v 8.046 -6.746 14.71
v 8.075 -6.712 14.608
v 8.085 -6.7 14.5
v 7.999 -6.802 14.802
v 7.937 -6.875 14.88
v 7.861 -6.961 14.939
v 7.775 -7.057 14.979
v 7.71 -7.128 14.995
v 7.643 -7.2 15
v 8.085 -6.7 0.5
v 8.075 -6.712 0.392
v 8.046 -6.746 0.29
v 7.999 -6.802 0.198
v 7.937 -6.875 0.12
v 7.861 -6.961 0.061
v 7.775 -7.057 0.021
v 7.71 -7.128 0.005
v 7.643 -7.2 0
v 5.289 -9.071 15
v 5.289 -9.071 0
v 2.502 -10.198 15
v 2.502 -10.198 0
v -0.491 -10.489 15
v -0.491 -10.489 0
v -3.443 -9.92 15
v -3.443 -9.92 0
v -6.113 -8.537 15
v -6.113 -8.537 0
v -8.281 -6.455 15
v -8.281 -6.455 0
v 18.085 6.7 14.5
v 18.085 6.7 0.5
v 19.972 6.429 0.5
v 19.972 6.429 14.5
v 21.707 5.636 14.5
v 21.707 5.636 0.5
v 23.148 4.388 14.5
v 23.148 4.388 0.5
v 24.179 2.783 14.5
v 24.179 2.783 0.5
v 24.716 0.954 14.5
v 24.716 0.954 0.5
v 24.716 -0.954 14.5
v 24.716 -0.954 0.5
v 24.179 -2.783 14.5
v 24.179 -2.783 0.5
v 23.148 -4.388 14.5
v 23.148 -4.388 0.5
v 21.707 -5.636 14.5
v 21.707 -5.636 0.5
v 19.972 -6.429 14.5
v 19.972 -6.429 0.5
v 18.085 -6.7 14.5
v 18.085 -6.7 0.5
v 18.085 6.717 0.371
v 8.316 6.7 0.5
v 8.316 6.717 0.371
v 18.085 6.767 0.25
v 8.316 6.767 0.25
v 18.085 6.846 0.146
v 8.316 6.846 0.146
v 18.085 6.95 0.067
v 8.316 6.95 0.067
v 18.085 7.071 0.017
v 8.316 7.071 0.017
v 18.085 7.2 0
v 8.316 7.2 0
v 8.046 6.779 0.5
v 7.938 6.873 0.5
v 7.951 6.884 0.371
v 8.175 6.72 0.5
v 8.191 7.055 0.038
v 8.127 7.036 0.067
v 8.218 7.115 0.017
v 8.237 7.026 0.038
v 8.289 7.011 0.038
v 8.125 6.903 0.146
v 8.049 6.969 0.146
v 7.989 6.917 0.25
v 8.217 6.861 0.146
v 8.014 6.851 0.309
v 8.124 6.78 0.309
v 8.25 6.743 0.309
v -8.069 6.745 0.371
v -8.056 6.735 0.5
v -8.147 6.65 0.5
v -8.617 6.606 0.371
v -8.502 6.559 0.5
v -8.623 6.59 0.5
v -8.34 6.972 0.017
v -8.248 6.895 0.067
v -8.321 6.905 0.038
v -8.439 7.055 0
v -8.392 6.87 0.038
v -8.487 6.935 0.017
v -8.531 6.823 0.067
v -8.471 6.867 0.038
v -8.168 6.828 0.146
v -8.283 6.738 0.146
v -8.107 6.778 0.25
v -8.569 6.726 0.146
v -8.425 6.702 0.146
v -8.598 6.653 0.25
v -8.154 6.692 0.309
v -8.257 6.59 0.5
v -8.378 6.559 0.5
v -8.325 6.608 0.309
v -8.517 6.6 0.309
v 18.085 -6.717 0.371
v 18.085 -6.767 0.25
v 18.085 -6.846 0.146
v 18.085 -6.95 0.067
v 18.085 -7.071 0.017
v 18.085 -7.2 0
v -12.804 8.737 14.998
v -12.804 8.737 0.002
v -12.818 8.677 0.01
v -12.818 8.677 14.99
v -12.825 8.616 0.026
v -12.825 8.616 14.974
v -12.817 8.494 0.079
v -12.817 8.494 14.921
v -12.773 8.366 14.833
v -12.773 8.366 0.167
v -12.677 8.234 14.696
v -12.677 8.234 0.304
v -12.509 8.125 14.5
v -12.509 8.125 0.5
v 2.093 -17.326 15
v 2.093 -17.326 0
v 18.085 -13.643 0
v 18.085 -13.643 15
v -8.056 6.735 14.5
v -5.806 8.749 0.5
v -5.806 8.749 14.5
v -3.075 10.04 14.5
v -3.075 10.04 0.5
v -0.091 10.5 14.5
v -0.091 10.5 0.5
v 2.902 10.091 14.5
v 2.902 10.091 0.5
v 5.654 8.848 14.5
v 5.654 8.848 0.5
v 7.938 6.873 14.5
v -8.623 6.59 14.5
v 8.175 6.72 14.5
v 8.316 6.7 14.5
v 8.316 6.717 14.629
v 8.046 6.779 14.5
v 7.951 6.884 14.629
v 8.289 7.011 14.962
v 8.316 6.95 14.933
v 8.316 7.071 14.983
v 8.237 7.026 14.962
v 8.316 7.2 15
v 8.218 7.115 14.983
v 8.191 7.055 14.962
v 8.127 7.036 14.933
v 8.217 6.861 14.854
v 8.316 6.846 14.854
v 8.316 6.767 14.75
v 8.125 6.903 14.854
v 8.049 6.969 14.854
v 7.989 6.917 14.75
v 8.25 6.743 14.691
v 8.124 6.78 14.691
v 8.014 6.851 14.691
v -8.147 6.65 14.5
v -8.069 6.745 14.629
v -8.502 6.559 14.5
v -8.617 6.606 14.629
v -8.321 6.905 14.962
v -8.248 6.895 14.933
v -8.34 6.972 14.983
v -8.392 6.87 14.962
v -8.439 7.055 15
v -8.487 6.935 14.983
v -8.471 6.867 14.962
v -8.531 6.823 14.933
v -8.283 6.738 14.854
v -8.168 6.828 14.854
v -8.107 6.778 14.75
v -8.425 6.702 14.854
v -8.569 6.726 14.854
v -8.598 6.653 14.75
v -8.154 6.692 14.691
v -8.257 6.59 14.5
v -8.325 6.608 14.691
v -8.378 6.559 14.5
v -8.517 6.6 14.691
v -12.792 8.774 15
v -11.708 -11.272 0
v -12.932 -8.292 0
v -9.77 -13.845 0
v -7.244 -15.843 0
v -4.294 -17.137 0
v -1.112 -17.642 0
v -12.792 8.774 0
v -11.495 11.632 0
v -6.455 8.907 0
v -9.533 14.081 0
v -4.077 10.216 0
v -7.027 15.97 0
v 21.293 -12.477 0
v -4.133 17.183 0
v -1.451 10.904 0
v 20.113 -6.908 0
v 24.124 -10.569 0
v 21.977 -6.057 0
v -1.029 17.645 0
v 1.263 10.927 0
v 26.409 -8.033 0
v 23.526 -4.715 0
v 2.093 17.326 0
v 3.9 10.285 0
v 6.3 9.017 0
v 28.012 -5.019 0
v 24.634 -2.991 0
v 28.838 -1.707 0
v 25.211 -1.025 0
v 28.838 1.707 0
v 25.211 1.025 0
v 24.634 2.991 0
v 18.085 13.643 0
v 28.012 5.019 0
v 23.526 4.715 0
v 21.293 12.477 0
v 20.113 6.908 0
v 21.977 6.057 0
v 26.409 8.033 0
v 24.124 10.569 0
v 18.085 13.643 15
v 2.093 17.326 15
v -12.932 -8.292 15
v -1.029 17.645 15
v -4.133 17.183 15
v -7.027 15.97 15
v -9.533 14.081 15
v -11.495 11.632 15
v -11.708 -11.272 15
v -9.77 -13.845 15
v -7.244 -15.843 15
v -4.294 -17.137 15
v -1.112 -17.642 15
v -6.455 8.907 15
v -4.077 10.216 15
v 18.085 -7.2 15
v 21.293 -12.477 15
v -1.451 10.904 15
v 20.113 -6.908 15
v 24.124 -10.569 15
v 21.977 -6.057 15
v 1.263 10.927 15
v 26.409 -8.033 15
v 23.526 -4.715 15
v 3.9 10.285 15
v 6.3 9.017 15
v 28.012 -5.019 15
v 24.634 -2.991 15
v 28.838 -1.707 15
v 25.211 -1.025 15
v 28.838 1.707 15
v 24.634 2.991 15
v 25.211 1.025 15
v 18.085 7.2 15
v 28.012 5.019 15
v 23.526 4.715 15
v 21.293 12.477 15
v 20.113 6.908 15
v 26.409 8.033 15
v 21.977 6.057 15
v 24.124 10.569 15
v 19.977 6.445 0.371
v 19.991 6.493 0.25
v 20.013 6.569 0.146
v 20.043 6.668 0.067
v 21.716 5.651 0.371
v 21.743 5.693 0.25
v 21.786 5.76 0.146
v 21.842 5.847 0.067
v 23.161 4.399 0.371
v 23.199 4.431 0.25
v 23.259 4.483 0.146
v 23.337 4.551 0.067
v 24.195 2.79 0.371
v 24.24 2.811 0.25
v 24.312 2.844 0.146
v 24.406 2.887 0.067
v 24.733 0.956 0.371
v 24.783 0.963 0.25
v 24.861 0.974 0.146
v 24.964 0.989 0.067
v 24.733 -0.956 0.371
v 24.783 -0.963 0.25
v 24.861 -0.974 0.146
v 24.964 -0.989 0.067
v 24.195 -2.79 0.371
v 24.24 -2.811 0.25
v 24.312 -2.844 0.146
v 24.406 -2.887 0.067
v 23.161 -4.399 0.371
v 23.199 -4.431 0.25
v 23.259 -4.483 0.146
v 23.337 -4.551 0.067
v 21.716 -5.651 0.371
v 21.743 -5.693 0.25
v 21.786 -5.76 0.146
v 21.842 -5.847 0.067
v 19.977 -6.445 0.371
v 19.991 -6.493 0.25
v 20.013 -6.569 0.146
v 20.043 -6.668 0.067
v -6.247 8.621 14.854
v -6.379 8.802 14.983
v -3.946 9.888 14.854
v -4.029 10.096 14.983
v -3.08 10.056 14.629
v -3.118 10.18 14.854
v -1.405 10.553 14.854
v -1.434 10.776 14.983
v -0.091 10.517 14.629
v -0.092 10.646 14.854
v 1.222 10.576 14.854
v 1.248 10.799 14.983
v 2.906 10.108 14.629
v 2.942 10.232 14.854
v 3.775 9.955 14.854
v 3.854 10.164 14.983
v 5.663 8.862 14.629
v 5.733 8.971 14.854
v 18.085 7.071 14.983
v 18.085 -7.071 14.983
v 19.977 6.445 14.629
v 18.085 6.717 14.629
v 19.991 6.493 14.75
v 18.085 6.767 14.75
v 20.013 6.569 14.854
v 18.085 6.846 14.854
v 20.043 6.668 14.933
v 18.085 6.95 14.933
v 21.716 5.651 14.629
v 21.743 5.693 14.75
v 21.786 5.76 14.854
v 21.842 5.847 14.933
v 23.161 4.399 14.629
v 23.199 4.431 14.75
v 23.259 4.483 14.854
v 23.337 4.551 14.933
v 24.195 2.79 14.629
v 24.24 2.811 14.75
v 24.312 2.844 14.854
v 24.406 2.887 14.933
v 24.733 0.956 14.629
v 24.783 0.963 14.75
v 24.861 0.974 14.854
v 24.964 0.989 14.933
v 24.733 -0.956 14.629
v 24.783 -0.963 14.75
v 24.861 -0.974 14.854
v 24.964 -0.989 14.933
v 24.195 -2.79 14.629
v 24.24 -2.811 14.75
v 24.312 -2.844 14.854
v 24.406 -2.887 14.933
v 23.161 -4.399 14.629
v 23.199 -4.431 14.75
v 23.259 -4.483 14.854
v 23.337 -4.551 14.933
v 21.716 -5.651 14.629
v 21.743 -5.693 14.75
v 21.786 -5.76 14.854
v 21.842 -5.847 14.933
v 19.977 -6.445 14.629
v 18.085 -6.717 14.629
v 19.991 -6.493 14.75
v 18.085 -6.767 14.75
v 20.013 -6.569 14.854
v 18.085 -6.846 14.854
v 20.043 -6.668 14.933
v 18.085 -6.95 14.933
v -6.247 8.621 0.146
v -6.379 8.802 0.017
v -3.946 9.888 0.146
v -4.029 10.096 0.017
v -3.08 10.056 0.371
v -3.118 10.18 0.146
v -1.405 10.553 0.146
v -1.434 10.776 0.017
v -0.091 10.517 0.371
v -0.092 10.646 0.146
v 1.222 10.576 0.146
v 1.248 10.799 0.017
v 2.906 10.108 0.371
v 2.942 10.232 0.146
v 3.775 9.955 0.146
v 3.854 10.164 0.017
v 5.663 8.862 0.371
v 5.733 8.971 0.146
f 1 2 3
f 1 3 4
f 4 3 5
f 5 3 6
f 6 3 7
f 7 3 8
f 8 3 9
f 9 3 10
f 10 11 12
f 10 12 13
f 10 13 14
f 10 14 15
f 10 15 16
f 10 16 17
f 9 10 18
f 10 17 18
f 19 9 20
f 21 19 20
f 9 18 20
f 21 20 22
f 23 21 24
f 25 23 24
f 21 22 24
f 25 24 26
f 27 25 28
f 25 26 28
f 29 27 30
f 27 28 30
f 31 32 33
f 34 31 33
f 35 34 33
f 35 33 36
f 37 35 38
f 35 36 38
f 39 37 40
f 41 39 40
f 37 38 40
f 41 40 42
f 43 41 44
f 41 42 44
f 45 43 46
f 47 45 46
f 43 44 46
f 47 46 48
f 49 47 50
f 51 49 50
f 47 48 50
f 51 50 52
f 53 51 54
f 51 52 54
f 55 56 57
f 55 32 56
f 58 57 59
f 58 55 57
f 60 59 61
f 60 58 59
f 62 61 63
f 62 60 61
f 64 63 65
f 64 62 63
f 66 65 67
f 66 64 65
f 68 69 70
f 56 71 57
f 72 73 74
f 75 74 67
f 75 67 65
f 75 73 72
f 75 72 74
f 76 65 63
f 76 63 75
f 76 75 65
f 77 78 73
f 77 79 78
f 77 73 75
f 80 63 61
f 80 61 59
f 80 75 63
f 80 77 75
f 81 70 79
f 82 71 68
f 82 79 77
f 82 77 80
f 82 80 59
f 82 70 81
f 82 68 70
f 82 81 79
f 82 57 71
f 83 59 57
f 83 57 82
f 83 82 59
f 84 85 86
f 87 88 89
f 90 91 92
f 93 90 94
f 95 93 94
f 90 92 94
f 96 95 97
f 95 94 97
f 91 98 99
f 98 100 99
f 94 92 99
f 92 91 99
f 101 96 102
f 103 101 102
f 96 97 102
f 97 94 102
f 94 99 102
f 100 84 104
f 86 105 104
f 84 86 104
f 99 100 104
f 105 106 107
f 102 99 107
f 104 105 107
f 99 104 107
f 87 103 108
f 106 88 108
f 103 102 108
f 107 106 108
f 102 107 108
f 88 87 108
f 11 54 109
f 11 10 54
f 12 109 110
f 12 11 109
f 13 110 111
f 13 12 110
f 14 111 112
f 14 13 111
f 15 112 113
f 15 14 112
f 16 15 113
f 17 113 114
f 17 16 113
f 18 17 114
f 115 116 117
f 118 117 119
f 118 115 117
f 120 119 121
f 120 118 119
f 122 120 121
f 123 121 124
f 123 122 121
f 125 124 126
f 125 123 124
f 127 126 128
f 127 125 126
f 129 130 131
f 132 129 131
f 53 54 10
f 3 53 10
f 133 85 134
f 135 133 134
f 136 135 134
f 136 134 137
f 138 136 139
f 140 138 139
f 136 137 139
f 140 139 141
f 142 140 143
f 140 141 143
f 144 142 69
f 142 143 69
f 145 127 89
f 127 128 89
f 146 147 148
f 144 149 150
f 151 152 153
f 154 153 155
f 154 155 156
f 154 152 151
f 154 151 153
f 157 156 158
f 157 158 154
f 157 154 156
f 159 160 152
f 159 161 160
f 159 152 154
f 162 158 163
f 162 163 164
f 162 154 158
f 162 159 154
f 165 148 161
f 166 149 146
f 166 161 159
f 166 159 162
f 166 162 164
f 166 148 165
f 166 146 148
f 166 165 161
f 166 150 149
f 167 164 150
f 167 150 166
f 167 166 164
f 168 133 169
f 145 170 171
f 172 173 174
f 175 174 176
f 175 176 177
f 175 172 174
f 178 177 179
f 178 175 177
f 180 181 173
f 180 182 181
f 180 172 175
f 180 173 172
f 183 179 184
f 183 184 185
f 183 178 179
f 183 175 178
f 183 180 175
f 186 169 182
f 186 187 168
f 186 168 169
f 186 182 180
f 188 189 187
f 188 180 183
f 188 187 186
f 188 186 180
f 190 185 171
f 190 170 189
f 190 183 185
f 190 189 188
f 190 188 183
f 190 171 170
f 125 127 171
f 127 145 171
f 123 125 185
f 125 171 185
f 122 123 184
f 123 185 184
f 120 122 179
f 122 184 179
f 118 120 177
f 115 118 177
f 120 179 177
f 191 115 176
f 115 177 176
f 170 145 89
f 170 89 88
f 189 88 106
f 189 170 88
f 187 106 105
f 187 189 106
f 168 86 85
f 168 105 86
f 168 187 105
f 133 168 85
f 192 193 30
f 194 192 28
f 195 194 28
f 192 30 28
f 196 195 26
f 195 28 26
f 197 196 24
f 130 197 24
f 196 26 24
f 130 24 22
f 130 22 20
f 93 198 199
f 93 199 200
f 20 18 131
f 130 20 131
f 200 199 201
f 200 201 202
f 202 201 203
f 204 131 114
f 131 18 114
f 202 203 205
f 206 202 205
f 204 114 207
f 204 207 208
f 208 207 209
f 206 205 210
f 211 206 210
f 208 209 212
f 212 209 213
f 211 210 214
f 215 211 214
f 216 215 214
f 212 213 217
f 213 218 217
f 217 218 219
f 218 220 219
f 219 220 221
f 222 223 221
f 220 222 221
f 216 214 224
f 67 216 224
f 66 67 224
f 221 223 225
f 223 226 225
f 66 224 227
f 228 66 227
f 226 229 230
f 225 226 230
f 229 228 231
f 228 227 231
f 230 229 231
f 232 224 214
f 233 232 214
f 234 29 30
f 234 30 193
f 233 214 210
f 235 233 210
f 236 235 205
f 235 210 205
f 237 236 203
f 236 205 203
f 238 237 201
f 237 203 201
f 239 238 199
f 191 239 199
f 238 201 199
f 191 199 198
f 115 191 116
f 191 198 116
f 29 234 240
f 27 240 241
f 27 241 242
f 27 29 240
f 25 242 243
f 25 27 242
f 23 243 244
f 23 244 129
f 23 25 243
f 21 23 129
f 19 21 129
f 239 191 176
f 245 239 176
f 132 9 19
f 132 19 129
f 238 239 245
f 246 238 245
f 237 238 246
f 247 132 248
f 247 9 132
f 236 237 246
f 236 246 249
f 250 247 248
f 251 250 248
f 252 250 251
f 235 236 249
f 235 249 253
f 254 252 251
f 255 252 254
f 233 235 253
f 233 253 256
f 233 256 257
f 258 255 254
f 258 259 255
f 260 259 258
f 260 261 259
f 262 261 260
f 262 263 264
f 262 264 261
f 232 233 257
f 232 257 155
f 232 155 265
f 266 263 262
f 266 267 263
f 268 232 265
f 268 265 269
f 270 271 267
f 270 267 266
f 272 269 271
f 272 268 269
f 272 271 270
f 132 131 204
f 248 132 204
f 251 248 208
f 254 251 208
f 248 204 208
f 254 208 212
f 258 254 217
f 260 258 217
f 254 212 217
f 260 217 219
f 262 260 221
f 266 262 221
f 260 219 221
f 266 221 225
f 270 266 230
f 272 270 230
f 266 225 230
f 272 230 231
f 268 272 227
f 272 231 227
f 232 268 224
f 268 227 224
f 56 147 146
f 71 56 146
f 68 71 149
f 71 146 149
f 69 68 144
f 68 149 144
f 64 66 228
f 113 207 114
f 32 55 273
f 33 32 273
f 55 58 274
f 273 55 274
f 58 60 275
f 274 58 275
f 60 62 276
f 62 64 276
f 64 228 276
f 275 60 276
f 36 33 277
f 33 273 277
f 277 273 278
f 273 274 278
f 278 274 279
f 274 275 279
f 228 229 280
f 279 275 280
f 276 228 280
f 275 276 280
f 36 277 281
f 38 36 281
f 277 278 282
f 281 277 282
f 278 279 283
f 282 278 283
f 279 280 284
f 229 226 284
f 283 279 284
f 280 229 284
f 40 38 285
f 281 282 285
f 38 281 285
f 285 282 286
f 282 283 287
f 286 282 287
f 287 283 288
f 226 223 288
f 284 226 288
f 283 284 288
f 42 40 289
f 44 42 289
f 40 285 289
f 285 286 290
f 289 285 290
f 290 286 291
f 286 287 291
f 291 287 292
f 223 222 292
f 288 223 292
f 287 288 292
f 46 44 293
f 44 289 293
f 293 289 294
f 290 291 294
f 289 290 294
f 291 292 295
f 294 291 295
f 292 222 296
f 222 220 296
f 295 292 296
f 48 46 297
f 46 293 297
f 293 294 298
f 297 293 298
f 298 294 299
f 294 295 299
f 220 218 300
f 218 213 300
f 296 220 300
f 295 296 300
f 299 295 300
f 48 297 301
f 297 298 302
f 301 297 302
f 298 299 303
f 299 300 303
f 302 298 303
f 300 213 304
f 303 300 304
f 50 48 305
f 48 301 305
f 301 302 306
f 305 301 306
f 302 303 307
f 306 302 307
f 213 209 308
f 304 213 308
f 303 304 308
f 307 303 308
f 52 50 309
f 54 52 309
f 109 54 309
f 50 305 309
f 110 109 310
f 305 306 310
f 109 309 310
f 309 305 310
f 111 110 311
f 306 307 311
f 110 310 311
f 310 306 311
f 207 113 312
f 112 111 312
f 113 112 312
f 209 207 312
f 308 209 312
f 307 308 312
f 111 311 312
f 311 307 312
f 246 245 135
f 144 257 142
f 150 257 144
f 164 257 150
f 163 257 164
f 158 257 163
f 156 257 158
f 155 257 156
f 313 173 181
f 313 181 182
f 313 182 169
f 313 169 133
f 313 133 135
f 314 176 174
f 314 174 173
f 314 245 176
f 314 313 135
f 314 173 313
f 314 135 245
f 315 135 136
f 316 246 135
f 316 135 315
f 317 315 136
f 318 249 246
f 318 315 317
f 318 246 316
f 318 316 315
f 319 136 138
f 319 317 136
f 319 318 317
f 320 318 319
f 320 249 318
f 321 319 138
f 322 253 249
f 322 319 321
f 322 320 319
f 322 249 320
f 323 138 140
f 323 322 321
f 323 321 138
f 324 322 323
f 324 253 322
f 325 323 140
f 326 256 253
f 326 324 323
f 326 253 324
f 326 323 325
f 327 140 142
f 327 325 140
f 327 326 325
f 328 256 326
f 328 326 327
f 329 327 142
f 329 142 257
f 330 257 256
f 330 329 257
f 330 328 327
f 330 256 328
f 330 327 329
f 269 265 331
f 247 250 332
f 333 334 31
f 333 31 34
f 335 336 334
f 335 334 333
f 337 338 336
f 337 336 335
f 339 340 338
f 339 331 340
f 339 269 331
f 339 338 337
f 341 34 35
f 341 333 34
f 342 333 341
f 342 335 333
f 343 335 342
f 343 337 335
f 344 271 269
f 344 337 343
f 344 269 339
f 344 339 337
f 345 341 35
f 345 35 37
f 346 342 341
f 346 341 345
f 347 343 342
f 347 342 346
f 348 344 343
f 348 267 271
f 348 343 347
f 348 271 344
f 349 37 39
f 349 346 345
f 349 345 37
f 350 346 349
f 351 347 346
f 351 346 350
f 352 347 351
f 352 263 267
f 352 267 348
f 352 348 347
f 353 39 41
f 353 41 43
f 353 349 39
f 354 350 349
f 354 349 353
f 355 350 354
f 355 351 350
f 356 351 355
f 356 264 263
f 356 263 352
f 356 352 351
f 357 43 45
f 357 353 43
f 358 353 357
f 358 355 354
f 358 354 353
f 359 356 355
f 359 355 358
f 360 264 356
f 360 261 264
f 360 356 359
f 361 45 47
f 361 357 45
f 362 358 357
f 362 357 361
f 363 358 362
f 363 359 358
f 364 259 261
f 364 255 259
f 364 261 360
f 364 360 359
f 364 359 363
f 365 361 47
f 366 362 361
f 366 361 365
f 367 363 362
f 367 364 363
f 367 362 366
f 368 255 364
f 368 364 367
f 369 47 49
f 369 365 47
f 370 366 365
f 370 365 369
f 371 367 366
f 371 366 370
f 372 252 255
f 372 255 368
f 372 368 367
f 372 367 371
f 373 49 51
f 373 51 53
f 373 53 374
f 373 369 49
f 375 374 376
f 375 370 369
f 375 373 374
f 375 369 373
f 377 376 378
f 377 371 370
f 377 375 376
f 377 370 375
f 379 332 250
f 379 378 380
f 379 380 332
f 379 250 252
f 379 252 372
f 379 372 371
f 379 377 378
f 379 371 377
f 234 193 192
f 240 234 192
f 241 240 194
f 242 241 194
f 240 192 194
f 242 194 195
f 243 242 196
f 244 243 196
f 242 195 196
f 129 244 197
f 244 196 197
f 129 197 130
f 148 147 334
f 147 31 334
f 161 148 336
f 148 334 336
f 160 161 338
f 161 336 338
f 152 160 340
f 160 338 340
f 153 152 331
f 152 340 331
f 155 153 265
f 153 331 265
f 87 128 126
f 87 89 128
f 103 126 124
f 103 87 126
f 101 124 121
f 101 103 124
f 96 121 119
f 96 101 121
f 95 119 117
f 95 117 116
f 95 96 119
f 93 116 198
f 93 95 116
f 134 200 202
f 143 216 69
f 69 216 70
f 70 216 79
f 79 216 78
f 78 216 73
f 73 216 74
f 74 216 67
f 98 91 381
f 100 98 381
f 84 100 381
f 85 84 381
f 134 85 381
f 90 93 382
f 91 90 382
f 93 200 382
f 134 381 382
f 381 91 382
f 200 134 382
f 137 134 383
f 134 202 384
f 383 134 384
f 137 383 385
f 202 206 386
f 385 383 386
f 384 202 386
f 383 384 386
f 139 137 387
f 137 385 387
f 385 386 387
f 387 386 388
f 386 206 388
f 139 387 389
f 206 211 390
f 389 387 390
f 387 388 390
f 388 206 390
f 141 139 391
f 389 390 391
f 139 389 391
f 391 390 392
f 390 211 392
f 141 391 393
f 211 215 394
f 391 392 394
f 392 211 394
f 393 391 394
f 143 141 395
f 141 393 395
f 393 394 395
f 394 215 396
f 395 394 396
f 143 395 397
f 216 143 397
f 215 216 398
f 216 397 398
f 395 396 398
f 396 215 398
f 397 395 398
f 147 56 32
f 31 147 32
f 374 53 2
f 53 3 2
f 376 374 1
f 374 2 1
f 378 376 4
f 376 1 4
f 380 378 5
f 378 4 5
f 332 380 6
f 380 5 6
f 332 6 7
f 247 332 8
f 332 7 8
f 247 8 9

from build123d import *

# Parameters (mm, degrees)
BOSS_EXTRU_1_DEPTH = 15
CONG_1_R           = 0.5


with BuildPart() as part:
    # Esquisse1 → Boss.-Extru.1 (new body)
    with BuildSketch(Plane.XY):
        with BuildLine():
            Line((8.084553173, 6.7), (18.084553173, 6.7))
            ThreePointArc((18.084553173, 6.7), (24.784553173, 0), (18.084553173, -6.7))
            Line((18.084553173, -6.7), (8.084553173, -6.7))
            ThreePointArc((8.084553173, -6.7), (-0.157024945, -10.498825799), (-8.281308366, -6.45522515))
            Line((-8.281308366, -6.45522515), (-12.931761957, -8.291874654))
            ThreePointArc((-12.931761957, -8.291874654), (-7.243702669, -15.843181093), (2.093196436, -17.325936129))
            Line((2.093196436, -17.325936129), (18.084553173, -13.642820952))
            ThreePointArc((18.084553173, -13.642820952), (28.942350685, 0), (18.084553173, 13.642820952))
            Line((18.084553173, 13.642820952), (2.093196436, 17.325936129))
            ThreePointArc((2.093196436, 17.325936129), (-7.243702669, 15.843181093), (-12.931761957, 8.291874654))
            Line((-12.931761957, 8.291874654), (-8.281308366, 6.45522515))
            ThreePointArc((-8.281308366, 6.45522515), (-0.157024945, 10.498825799), (8.084553173, 6.7))
        make_face()
    extrude(amount=BOSS_EXTRU_1_DEPTH)

    # Congé1
    cong_1_edges = [part.edges().sort_by_distance(p)[0] for p in [
        (24.784553173, 0, 15),
        (24.784553173, 0, 0),
        (13.084553173, 6.7, 15),
        (13.084553173, 6.7, 0),
        (-10.606535162, 7.373549902, 15),
        (-10.606535162, 7.373549902, 0),
        (-8.281308366, 6.45522515, 7.5),
        (-0.157024945, 10.498825799, 15),
        (8.084553173, 6.7, 7.5),
        (-0.157024945, 10.498825799, 0),
        (13.084553173, -6.7, 15),
        (13.084553173, -6.7, 0),
        (-12.931761957, 8.291874654, 7.5),
    ]]
    fillet(cong_1_edges, radius=CONG_1_R)


solid = part.part
